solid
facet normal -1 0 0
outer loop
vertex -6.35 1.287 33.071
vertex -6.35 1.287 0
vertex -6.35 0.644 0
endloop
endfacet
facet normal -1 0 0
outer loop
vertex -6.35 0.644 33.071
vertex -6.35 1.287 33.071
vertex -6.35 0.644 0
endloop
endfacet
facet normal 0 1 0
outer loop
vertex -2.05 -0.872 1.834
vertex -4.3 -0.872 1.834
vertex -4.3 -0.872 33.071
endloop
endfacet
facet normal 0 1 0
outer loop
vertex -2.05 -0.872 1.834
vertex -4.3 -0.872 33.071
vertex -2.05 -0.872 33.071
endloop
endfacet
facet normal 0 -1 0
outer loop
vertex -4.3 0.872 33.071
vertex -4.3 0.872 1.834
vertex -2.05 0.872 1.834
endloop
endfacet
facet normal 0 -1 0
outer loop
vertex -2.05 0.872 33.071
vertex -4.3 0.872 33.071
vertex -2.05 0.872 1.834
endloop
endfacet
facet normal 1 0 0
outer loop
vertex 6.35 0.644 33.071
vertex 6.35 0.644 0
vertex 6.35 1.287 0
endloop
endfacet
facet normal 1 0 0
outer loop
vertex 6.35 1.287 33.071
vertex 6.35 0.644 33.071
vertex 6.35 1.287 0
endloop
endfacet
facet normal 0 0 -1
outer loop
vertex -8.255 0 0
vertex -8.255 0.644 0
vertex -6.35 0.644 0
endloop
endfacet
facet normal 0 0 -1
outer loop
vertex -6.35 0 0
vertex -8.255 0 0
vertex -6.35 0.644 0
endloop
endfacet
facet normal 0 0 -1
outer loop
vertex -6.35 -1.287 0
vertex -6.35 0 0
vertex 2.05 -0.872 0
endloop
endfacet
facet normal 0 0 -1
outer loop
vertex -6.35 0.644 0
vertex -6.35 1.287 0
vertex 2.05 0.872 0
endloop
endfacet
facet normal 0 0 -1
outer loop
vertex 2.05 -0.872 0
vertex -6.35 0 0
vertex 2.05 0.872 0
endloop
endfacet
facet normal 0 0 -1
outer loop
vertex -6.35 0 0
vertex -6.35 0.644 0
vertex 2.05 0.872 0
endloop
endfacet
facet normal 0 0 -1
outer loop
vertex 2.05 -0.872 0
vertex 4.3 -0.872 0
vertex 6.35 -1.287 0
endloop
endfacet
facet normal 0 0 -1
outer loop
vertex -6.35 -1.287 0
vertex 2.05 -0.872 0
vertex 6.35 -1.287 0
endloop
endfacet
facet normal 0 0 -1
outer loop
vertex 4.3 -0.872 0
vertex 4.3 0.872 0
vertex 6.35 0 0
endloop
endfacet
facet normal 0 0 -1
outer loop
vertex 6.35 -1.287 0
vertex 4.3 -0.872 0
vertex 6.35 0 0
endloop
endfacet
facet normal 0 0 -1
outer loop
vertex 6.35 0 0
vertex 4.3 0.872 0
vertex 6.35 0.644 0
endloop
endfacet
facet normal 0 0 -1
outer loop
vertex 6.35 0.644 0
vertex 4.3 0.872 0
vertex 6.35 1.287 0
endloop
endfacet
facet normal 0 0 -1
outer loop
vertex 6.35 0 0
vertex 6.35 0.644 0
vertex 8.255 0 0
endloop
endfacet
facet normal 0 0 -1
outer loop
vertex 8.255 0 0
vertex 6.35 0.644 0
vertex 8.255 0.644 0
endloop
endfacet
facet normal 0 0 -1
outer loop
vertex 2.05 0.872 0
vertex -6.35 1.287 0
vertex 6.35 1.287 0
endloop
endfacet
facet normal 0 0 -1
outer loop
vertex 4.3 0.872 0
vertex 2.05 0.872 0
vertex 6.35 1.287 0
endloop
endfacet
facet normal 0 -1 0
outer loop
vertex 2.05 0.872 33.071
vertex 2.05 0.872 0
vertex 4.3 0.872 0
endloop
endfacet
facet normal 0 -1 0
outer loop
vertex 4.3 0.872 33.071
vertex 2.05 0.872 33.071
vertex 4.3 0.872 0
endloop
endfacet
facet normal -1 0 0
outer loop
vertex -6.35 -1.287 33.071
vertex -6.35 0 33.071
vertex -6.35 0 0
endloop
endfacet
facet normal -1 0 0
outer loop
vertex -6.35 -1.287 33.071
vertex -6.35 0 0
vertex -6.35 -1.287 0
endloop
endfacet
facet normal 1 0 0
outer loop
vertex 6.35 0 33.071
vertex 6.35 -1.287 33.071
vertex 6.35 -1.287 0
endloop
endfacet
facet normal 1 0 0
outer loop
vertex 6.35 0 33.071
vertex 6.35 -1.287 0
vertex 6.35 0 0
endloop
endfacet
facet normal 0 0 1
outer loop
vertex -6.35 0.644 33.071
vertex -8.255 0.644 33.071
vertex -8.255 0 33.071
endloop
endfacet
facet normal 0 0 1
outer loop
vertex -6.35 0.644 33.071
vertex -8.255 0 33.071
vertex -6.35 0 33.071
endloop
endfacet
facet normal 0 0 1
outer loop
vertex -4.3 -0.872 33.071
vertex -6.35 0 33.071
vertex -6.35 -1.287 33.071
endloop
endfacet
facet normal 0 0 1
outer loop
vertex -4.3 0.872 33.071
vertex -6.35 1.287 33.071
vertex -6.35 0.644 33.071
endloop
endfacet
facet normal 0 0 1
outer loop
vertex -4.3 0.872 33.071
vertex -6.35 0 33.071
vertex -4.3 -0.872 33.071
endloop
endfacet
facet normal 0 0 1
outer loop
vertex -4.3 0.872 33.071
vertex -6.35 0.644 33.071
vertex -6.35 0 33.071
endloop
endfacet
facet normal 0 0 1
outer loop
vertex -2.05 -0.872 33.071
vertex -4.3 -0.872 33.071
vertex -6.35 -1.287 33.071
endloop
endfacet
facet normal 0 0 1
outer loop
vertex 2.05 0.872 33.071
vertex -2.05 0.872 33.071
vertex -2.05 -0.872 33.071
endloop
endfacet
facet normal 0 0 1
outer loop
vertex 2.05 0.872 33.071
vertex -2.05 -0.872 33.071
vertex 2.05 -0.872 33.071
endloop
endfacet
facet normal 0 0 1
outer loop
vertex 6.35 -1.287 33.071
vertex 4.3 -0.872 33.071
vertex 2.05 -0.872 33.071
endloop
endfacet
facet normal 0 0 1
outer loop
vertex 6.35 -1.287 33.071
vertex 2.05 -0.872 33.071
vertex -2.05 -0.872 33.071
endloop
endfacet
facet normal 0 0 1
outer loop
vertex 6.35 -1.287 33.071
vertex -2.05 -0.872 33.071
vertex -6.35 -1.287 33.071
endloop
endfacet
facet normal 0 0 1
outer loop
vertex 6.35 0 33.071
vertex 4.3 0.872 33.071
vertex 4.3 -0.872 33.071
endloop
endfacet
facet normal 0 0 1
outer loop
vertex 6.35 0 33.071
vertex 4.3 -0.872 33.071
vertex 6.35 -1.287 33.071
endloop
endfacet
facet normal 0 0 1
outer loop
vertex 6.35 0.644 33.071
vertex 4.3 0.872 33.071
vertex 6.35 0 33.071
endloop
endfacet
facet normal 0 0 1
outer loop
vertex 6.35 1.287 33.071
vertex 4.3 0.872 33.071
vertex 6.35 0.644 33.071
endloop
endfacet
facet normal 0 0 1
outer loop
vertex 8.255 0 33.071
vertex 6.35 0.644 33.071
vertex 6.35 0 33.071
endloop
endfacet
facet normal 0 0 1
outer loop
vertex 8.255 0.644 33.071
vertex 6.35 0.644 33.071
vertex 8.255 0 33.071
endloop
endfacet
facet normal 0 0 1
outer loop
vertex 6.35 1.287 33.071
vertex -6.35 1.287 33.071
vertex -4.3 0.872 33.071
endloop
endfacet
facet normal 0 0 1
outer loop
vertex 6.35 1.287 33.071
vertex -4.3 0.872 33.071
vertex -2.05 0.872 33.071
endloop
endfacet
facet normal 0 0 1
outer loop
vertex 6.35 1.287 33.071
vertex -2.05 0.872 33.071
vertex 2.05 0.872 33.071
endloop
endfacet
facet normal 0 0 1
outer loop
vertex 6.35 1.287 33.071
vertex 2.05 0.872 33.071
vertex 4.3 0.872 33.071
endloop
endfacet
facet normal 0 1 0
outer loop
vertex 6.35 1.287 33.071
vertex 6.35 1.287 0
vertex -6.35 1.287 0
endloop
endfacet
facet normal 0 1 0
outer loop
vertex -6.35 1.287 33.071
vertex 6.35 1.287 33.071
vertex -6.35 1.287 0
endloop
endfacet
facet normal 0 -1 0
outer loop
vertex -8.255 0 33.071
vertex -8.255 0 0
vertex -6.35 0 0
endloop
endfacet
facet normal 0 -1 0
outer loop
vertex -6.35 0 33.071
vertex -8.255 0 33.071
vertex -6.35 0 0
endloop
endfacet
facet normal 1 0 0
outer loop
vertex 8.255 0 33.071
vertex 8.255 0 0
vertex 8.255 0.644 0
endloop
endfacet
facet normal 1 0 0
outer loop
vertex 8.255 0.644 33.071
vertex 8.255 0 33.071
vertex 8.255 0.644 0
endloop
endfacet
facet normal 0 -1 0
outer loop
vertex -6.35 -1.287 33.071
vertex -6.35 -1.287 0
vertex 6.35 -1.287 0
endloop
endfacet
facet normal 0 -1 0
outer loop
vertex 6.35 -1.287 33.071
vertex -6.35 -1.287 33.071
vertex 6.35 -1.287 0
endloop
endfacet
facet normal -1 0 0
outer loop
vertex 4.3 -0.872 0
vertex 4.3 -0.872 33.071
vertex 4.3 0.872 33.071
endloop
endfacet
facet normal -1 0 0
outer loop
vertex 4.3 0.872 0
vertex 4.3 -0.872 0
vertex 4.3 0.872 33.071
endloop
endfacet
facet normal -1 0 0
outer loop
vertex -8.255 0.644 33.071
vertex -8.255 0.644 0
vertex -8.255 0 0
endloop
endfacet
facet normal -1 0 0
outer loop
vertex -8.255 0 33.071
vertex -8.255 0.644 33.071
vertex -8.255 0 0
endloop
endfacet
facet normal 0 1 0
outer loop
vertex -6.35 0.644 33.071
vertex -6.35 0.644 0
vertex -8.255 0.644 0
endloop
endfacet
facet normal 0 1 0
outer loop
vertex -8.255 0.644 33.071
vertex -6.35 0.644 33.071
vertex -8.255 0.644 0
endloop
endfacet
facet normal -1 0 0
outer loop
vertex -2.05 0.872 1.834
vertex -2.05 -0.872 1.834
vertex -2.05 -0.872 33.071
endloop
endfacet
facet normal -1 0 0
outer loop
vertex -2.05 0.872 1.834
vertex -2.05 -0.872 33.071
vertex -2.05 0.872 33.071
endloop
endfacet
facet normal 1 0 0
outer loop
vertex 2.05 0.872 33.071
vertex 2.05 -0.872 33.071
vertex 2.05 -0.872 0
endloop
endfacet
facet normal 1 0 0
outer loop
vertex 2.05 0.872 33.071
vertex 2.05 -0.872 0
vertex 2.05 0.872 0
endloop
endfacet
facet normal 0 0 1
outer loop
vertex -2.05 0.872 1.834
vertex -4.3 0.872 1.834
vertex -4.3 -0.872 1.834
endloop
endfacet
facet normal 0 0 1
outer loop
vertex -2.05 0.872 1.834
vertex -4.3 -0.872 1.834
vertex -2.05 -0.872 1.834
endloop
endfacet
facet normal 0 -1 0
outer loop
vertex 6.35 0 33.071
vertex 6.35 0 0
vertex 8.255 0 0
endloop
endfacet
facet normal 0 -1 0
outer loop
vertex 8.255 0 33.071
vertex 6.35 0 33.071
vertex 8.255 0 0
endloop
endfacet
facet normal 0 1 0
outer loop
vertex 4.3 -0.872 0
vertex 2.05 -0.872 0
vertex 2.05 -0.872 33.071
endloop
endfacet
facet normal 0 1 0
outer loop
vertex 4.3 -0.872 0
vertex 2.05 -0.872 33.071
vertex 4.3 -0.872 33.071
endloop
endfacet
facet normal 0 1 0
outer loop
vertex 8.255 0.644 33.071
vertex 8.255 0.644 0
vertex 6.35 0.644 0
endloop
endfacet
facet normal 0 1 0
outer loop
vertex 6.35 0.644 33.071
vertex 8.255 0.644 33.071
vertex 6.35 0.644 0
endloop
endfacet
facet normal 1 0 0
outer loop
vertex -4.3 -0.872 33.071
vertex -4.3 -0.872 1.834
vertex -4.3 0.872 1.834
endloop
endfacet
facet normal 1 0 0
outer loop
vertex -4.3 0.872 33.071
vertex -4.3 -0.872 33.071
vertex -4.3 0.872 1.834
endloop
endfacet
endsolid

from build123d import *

# Parameters (mm, degrees)
F0_W     = 2.2499504322
F0_H     = 1.7434554408
F1_DEPTH = 1.1348915286
F3_DEPTH = 1.8342579715
F4_DEPTH = 33.0712201539


# Not quite as in the source:
# - the program builds the solid bodies; features that only make, move or delete a surface that nothing else refers to are left out


with BuildPart() as f1:
    # F0 (on Top) → F1 (new body)
    with BuildSketch(Plane.XY):
        Polygon((6.35, 1.2873262627), (-6.35, 1.2873262627), (-6.35, 0.6436631313), (-8.2549656289, 0.6436631313), (-8.2549656289, 0), (-6.35, 0), (-6.35, -1.2873262627), (6.35, -1.2873262627), (6.35, 0), (8.2549656289, 0), (8.2549656289, 0.6436631313), (6.35, 0.6436631313), align=None)
        with Locations((3.175, 0)):
            Rectangle(F0_W, F0_H, mode=Mode.SUBTRACT)
        with Locations((-3.175, 0)):
            Rectangle(F0_W, F0_H, mode=Mode.SUBTRACT)
    extrude(amount=F1_DEPTH)

    # F0 (on Top) → F3 (join)
    with BuildSketch(Plane.XY):
        with Locations((-3.175, 0)):
            Rectangle(F0_W, F0_H)
    extrude(amount=F3_DEPTH)

    # F0 (on Top) → F4 (join)
    with BuildSketch(Plane.XY):
        Polygon((6.35, 1.2873262627), (-6.35, 1.2873262627), (-6.35, 0.6436631313), (-8.2549656289, 0.6436631313), (-8.2549656289, 0), (-6.35, 0), (-6.35, -1.2873262627), (6.35, -1.2873262627), (6.35, 0), (8.2549656289, 0), (8.2549656289, 0.6436631313), (6.35, 0.6436631313), align=None)
        with Locations((3.175, 0)):
            Rectangle(F0_W, F0_H, mode=Mode.SUBTRACT)
        with Locations((-3.175, 0)):
            Rectangle(F0_W, F0_H, mode=Mode.SUBTRACT)
    extrude(amount=F4_DEPTH)


solid = f1.part
